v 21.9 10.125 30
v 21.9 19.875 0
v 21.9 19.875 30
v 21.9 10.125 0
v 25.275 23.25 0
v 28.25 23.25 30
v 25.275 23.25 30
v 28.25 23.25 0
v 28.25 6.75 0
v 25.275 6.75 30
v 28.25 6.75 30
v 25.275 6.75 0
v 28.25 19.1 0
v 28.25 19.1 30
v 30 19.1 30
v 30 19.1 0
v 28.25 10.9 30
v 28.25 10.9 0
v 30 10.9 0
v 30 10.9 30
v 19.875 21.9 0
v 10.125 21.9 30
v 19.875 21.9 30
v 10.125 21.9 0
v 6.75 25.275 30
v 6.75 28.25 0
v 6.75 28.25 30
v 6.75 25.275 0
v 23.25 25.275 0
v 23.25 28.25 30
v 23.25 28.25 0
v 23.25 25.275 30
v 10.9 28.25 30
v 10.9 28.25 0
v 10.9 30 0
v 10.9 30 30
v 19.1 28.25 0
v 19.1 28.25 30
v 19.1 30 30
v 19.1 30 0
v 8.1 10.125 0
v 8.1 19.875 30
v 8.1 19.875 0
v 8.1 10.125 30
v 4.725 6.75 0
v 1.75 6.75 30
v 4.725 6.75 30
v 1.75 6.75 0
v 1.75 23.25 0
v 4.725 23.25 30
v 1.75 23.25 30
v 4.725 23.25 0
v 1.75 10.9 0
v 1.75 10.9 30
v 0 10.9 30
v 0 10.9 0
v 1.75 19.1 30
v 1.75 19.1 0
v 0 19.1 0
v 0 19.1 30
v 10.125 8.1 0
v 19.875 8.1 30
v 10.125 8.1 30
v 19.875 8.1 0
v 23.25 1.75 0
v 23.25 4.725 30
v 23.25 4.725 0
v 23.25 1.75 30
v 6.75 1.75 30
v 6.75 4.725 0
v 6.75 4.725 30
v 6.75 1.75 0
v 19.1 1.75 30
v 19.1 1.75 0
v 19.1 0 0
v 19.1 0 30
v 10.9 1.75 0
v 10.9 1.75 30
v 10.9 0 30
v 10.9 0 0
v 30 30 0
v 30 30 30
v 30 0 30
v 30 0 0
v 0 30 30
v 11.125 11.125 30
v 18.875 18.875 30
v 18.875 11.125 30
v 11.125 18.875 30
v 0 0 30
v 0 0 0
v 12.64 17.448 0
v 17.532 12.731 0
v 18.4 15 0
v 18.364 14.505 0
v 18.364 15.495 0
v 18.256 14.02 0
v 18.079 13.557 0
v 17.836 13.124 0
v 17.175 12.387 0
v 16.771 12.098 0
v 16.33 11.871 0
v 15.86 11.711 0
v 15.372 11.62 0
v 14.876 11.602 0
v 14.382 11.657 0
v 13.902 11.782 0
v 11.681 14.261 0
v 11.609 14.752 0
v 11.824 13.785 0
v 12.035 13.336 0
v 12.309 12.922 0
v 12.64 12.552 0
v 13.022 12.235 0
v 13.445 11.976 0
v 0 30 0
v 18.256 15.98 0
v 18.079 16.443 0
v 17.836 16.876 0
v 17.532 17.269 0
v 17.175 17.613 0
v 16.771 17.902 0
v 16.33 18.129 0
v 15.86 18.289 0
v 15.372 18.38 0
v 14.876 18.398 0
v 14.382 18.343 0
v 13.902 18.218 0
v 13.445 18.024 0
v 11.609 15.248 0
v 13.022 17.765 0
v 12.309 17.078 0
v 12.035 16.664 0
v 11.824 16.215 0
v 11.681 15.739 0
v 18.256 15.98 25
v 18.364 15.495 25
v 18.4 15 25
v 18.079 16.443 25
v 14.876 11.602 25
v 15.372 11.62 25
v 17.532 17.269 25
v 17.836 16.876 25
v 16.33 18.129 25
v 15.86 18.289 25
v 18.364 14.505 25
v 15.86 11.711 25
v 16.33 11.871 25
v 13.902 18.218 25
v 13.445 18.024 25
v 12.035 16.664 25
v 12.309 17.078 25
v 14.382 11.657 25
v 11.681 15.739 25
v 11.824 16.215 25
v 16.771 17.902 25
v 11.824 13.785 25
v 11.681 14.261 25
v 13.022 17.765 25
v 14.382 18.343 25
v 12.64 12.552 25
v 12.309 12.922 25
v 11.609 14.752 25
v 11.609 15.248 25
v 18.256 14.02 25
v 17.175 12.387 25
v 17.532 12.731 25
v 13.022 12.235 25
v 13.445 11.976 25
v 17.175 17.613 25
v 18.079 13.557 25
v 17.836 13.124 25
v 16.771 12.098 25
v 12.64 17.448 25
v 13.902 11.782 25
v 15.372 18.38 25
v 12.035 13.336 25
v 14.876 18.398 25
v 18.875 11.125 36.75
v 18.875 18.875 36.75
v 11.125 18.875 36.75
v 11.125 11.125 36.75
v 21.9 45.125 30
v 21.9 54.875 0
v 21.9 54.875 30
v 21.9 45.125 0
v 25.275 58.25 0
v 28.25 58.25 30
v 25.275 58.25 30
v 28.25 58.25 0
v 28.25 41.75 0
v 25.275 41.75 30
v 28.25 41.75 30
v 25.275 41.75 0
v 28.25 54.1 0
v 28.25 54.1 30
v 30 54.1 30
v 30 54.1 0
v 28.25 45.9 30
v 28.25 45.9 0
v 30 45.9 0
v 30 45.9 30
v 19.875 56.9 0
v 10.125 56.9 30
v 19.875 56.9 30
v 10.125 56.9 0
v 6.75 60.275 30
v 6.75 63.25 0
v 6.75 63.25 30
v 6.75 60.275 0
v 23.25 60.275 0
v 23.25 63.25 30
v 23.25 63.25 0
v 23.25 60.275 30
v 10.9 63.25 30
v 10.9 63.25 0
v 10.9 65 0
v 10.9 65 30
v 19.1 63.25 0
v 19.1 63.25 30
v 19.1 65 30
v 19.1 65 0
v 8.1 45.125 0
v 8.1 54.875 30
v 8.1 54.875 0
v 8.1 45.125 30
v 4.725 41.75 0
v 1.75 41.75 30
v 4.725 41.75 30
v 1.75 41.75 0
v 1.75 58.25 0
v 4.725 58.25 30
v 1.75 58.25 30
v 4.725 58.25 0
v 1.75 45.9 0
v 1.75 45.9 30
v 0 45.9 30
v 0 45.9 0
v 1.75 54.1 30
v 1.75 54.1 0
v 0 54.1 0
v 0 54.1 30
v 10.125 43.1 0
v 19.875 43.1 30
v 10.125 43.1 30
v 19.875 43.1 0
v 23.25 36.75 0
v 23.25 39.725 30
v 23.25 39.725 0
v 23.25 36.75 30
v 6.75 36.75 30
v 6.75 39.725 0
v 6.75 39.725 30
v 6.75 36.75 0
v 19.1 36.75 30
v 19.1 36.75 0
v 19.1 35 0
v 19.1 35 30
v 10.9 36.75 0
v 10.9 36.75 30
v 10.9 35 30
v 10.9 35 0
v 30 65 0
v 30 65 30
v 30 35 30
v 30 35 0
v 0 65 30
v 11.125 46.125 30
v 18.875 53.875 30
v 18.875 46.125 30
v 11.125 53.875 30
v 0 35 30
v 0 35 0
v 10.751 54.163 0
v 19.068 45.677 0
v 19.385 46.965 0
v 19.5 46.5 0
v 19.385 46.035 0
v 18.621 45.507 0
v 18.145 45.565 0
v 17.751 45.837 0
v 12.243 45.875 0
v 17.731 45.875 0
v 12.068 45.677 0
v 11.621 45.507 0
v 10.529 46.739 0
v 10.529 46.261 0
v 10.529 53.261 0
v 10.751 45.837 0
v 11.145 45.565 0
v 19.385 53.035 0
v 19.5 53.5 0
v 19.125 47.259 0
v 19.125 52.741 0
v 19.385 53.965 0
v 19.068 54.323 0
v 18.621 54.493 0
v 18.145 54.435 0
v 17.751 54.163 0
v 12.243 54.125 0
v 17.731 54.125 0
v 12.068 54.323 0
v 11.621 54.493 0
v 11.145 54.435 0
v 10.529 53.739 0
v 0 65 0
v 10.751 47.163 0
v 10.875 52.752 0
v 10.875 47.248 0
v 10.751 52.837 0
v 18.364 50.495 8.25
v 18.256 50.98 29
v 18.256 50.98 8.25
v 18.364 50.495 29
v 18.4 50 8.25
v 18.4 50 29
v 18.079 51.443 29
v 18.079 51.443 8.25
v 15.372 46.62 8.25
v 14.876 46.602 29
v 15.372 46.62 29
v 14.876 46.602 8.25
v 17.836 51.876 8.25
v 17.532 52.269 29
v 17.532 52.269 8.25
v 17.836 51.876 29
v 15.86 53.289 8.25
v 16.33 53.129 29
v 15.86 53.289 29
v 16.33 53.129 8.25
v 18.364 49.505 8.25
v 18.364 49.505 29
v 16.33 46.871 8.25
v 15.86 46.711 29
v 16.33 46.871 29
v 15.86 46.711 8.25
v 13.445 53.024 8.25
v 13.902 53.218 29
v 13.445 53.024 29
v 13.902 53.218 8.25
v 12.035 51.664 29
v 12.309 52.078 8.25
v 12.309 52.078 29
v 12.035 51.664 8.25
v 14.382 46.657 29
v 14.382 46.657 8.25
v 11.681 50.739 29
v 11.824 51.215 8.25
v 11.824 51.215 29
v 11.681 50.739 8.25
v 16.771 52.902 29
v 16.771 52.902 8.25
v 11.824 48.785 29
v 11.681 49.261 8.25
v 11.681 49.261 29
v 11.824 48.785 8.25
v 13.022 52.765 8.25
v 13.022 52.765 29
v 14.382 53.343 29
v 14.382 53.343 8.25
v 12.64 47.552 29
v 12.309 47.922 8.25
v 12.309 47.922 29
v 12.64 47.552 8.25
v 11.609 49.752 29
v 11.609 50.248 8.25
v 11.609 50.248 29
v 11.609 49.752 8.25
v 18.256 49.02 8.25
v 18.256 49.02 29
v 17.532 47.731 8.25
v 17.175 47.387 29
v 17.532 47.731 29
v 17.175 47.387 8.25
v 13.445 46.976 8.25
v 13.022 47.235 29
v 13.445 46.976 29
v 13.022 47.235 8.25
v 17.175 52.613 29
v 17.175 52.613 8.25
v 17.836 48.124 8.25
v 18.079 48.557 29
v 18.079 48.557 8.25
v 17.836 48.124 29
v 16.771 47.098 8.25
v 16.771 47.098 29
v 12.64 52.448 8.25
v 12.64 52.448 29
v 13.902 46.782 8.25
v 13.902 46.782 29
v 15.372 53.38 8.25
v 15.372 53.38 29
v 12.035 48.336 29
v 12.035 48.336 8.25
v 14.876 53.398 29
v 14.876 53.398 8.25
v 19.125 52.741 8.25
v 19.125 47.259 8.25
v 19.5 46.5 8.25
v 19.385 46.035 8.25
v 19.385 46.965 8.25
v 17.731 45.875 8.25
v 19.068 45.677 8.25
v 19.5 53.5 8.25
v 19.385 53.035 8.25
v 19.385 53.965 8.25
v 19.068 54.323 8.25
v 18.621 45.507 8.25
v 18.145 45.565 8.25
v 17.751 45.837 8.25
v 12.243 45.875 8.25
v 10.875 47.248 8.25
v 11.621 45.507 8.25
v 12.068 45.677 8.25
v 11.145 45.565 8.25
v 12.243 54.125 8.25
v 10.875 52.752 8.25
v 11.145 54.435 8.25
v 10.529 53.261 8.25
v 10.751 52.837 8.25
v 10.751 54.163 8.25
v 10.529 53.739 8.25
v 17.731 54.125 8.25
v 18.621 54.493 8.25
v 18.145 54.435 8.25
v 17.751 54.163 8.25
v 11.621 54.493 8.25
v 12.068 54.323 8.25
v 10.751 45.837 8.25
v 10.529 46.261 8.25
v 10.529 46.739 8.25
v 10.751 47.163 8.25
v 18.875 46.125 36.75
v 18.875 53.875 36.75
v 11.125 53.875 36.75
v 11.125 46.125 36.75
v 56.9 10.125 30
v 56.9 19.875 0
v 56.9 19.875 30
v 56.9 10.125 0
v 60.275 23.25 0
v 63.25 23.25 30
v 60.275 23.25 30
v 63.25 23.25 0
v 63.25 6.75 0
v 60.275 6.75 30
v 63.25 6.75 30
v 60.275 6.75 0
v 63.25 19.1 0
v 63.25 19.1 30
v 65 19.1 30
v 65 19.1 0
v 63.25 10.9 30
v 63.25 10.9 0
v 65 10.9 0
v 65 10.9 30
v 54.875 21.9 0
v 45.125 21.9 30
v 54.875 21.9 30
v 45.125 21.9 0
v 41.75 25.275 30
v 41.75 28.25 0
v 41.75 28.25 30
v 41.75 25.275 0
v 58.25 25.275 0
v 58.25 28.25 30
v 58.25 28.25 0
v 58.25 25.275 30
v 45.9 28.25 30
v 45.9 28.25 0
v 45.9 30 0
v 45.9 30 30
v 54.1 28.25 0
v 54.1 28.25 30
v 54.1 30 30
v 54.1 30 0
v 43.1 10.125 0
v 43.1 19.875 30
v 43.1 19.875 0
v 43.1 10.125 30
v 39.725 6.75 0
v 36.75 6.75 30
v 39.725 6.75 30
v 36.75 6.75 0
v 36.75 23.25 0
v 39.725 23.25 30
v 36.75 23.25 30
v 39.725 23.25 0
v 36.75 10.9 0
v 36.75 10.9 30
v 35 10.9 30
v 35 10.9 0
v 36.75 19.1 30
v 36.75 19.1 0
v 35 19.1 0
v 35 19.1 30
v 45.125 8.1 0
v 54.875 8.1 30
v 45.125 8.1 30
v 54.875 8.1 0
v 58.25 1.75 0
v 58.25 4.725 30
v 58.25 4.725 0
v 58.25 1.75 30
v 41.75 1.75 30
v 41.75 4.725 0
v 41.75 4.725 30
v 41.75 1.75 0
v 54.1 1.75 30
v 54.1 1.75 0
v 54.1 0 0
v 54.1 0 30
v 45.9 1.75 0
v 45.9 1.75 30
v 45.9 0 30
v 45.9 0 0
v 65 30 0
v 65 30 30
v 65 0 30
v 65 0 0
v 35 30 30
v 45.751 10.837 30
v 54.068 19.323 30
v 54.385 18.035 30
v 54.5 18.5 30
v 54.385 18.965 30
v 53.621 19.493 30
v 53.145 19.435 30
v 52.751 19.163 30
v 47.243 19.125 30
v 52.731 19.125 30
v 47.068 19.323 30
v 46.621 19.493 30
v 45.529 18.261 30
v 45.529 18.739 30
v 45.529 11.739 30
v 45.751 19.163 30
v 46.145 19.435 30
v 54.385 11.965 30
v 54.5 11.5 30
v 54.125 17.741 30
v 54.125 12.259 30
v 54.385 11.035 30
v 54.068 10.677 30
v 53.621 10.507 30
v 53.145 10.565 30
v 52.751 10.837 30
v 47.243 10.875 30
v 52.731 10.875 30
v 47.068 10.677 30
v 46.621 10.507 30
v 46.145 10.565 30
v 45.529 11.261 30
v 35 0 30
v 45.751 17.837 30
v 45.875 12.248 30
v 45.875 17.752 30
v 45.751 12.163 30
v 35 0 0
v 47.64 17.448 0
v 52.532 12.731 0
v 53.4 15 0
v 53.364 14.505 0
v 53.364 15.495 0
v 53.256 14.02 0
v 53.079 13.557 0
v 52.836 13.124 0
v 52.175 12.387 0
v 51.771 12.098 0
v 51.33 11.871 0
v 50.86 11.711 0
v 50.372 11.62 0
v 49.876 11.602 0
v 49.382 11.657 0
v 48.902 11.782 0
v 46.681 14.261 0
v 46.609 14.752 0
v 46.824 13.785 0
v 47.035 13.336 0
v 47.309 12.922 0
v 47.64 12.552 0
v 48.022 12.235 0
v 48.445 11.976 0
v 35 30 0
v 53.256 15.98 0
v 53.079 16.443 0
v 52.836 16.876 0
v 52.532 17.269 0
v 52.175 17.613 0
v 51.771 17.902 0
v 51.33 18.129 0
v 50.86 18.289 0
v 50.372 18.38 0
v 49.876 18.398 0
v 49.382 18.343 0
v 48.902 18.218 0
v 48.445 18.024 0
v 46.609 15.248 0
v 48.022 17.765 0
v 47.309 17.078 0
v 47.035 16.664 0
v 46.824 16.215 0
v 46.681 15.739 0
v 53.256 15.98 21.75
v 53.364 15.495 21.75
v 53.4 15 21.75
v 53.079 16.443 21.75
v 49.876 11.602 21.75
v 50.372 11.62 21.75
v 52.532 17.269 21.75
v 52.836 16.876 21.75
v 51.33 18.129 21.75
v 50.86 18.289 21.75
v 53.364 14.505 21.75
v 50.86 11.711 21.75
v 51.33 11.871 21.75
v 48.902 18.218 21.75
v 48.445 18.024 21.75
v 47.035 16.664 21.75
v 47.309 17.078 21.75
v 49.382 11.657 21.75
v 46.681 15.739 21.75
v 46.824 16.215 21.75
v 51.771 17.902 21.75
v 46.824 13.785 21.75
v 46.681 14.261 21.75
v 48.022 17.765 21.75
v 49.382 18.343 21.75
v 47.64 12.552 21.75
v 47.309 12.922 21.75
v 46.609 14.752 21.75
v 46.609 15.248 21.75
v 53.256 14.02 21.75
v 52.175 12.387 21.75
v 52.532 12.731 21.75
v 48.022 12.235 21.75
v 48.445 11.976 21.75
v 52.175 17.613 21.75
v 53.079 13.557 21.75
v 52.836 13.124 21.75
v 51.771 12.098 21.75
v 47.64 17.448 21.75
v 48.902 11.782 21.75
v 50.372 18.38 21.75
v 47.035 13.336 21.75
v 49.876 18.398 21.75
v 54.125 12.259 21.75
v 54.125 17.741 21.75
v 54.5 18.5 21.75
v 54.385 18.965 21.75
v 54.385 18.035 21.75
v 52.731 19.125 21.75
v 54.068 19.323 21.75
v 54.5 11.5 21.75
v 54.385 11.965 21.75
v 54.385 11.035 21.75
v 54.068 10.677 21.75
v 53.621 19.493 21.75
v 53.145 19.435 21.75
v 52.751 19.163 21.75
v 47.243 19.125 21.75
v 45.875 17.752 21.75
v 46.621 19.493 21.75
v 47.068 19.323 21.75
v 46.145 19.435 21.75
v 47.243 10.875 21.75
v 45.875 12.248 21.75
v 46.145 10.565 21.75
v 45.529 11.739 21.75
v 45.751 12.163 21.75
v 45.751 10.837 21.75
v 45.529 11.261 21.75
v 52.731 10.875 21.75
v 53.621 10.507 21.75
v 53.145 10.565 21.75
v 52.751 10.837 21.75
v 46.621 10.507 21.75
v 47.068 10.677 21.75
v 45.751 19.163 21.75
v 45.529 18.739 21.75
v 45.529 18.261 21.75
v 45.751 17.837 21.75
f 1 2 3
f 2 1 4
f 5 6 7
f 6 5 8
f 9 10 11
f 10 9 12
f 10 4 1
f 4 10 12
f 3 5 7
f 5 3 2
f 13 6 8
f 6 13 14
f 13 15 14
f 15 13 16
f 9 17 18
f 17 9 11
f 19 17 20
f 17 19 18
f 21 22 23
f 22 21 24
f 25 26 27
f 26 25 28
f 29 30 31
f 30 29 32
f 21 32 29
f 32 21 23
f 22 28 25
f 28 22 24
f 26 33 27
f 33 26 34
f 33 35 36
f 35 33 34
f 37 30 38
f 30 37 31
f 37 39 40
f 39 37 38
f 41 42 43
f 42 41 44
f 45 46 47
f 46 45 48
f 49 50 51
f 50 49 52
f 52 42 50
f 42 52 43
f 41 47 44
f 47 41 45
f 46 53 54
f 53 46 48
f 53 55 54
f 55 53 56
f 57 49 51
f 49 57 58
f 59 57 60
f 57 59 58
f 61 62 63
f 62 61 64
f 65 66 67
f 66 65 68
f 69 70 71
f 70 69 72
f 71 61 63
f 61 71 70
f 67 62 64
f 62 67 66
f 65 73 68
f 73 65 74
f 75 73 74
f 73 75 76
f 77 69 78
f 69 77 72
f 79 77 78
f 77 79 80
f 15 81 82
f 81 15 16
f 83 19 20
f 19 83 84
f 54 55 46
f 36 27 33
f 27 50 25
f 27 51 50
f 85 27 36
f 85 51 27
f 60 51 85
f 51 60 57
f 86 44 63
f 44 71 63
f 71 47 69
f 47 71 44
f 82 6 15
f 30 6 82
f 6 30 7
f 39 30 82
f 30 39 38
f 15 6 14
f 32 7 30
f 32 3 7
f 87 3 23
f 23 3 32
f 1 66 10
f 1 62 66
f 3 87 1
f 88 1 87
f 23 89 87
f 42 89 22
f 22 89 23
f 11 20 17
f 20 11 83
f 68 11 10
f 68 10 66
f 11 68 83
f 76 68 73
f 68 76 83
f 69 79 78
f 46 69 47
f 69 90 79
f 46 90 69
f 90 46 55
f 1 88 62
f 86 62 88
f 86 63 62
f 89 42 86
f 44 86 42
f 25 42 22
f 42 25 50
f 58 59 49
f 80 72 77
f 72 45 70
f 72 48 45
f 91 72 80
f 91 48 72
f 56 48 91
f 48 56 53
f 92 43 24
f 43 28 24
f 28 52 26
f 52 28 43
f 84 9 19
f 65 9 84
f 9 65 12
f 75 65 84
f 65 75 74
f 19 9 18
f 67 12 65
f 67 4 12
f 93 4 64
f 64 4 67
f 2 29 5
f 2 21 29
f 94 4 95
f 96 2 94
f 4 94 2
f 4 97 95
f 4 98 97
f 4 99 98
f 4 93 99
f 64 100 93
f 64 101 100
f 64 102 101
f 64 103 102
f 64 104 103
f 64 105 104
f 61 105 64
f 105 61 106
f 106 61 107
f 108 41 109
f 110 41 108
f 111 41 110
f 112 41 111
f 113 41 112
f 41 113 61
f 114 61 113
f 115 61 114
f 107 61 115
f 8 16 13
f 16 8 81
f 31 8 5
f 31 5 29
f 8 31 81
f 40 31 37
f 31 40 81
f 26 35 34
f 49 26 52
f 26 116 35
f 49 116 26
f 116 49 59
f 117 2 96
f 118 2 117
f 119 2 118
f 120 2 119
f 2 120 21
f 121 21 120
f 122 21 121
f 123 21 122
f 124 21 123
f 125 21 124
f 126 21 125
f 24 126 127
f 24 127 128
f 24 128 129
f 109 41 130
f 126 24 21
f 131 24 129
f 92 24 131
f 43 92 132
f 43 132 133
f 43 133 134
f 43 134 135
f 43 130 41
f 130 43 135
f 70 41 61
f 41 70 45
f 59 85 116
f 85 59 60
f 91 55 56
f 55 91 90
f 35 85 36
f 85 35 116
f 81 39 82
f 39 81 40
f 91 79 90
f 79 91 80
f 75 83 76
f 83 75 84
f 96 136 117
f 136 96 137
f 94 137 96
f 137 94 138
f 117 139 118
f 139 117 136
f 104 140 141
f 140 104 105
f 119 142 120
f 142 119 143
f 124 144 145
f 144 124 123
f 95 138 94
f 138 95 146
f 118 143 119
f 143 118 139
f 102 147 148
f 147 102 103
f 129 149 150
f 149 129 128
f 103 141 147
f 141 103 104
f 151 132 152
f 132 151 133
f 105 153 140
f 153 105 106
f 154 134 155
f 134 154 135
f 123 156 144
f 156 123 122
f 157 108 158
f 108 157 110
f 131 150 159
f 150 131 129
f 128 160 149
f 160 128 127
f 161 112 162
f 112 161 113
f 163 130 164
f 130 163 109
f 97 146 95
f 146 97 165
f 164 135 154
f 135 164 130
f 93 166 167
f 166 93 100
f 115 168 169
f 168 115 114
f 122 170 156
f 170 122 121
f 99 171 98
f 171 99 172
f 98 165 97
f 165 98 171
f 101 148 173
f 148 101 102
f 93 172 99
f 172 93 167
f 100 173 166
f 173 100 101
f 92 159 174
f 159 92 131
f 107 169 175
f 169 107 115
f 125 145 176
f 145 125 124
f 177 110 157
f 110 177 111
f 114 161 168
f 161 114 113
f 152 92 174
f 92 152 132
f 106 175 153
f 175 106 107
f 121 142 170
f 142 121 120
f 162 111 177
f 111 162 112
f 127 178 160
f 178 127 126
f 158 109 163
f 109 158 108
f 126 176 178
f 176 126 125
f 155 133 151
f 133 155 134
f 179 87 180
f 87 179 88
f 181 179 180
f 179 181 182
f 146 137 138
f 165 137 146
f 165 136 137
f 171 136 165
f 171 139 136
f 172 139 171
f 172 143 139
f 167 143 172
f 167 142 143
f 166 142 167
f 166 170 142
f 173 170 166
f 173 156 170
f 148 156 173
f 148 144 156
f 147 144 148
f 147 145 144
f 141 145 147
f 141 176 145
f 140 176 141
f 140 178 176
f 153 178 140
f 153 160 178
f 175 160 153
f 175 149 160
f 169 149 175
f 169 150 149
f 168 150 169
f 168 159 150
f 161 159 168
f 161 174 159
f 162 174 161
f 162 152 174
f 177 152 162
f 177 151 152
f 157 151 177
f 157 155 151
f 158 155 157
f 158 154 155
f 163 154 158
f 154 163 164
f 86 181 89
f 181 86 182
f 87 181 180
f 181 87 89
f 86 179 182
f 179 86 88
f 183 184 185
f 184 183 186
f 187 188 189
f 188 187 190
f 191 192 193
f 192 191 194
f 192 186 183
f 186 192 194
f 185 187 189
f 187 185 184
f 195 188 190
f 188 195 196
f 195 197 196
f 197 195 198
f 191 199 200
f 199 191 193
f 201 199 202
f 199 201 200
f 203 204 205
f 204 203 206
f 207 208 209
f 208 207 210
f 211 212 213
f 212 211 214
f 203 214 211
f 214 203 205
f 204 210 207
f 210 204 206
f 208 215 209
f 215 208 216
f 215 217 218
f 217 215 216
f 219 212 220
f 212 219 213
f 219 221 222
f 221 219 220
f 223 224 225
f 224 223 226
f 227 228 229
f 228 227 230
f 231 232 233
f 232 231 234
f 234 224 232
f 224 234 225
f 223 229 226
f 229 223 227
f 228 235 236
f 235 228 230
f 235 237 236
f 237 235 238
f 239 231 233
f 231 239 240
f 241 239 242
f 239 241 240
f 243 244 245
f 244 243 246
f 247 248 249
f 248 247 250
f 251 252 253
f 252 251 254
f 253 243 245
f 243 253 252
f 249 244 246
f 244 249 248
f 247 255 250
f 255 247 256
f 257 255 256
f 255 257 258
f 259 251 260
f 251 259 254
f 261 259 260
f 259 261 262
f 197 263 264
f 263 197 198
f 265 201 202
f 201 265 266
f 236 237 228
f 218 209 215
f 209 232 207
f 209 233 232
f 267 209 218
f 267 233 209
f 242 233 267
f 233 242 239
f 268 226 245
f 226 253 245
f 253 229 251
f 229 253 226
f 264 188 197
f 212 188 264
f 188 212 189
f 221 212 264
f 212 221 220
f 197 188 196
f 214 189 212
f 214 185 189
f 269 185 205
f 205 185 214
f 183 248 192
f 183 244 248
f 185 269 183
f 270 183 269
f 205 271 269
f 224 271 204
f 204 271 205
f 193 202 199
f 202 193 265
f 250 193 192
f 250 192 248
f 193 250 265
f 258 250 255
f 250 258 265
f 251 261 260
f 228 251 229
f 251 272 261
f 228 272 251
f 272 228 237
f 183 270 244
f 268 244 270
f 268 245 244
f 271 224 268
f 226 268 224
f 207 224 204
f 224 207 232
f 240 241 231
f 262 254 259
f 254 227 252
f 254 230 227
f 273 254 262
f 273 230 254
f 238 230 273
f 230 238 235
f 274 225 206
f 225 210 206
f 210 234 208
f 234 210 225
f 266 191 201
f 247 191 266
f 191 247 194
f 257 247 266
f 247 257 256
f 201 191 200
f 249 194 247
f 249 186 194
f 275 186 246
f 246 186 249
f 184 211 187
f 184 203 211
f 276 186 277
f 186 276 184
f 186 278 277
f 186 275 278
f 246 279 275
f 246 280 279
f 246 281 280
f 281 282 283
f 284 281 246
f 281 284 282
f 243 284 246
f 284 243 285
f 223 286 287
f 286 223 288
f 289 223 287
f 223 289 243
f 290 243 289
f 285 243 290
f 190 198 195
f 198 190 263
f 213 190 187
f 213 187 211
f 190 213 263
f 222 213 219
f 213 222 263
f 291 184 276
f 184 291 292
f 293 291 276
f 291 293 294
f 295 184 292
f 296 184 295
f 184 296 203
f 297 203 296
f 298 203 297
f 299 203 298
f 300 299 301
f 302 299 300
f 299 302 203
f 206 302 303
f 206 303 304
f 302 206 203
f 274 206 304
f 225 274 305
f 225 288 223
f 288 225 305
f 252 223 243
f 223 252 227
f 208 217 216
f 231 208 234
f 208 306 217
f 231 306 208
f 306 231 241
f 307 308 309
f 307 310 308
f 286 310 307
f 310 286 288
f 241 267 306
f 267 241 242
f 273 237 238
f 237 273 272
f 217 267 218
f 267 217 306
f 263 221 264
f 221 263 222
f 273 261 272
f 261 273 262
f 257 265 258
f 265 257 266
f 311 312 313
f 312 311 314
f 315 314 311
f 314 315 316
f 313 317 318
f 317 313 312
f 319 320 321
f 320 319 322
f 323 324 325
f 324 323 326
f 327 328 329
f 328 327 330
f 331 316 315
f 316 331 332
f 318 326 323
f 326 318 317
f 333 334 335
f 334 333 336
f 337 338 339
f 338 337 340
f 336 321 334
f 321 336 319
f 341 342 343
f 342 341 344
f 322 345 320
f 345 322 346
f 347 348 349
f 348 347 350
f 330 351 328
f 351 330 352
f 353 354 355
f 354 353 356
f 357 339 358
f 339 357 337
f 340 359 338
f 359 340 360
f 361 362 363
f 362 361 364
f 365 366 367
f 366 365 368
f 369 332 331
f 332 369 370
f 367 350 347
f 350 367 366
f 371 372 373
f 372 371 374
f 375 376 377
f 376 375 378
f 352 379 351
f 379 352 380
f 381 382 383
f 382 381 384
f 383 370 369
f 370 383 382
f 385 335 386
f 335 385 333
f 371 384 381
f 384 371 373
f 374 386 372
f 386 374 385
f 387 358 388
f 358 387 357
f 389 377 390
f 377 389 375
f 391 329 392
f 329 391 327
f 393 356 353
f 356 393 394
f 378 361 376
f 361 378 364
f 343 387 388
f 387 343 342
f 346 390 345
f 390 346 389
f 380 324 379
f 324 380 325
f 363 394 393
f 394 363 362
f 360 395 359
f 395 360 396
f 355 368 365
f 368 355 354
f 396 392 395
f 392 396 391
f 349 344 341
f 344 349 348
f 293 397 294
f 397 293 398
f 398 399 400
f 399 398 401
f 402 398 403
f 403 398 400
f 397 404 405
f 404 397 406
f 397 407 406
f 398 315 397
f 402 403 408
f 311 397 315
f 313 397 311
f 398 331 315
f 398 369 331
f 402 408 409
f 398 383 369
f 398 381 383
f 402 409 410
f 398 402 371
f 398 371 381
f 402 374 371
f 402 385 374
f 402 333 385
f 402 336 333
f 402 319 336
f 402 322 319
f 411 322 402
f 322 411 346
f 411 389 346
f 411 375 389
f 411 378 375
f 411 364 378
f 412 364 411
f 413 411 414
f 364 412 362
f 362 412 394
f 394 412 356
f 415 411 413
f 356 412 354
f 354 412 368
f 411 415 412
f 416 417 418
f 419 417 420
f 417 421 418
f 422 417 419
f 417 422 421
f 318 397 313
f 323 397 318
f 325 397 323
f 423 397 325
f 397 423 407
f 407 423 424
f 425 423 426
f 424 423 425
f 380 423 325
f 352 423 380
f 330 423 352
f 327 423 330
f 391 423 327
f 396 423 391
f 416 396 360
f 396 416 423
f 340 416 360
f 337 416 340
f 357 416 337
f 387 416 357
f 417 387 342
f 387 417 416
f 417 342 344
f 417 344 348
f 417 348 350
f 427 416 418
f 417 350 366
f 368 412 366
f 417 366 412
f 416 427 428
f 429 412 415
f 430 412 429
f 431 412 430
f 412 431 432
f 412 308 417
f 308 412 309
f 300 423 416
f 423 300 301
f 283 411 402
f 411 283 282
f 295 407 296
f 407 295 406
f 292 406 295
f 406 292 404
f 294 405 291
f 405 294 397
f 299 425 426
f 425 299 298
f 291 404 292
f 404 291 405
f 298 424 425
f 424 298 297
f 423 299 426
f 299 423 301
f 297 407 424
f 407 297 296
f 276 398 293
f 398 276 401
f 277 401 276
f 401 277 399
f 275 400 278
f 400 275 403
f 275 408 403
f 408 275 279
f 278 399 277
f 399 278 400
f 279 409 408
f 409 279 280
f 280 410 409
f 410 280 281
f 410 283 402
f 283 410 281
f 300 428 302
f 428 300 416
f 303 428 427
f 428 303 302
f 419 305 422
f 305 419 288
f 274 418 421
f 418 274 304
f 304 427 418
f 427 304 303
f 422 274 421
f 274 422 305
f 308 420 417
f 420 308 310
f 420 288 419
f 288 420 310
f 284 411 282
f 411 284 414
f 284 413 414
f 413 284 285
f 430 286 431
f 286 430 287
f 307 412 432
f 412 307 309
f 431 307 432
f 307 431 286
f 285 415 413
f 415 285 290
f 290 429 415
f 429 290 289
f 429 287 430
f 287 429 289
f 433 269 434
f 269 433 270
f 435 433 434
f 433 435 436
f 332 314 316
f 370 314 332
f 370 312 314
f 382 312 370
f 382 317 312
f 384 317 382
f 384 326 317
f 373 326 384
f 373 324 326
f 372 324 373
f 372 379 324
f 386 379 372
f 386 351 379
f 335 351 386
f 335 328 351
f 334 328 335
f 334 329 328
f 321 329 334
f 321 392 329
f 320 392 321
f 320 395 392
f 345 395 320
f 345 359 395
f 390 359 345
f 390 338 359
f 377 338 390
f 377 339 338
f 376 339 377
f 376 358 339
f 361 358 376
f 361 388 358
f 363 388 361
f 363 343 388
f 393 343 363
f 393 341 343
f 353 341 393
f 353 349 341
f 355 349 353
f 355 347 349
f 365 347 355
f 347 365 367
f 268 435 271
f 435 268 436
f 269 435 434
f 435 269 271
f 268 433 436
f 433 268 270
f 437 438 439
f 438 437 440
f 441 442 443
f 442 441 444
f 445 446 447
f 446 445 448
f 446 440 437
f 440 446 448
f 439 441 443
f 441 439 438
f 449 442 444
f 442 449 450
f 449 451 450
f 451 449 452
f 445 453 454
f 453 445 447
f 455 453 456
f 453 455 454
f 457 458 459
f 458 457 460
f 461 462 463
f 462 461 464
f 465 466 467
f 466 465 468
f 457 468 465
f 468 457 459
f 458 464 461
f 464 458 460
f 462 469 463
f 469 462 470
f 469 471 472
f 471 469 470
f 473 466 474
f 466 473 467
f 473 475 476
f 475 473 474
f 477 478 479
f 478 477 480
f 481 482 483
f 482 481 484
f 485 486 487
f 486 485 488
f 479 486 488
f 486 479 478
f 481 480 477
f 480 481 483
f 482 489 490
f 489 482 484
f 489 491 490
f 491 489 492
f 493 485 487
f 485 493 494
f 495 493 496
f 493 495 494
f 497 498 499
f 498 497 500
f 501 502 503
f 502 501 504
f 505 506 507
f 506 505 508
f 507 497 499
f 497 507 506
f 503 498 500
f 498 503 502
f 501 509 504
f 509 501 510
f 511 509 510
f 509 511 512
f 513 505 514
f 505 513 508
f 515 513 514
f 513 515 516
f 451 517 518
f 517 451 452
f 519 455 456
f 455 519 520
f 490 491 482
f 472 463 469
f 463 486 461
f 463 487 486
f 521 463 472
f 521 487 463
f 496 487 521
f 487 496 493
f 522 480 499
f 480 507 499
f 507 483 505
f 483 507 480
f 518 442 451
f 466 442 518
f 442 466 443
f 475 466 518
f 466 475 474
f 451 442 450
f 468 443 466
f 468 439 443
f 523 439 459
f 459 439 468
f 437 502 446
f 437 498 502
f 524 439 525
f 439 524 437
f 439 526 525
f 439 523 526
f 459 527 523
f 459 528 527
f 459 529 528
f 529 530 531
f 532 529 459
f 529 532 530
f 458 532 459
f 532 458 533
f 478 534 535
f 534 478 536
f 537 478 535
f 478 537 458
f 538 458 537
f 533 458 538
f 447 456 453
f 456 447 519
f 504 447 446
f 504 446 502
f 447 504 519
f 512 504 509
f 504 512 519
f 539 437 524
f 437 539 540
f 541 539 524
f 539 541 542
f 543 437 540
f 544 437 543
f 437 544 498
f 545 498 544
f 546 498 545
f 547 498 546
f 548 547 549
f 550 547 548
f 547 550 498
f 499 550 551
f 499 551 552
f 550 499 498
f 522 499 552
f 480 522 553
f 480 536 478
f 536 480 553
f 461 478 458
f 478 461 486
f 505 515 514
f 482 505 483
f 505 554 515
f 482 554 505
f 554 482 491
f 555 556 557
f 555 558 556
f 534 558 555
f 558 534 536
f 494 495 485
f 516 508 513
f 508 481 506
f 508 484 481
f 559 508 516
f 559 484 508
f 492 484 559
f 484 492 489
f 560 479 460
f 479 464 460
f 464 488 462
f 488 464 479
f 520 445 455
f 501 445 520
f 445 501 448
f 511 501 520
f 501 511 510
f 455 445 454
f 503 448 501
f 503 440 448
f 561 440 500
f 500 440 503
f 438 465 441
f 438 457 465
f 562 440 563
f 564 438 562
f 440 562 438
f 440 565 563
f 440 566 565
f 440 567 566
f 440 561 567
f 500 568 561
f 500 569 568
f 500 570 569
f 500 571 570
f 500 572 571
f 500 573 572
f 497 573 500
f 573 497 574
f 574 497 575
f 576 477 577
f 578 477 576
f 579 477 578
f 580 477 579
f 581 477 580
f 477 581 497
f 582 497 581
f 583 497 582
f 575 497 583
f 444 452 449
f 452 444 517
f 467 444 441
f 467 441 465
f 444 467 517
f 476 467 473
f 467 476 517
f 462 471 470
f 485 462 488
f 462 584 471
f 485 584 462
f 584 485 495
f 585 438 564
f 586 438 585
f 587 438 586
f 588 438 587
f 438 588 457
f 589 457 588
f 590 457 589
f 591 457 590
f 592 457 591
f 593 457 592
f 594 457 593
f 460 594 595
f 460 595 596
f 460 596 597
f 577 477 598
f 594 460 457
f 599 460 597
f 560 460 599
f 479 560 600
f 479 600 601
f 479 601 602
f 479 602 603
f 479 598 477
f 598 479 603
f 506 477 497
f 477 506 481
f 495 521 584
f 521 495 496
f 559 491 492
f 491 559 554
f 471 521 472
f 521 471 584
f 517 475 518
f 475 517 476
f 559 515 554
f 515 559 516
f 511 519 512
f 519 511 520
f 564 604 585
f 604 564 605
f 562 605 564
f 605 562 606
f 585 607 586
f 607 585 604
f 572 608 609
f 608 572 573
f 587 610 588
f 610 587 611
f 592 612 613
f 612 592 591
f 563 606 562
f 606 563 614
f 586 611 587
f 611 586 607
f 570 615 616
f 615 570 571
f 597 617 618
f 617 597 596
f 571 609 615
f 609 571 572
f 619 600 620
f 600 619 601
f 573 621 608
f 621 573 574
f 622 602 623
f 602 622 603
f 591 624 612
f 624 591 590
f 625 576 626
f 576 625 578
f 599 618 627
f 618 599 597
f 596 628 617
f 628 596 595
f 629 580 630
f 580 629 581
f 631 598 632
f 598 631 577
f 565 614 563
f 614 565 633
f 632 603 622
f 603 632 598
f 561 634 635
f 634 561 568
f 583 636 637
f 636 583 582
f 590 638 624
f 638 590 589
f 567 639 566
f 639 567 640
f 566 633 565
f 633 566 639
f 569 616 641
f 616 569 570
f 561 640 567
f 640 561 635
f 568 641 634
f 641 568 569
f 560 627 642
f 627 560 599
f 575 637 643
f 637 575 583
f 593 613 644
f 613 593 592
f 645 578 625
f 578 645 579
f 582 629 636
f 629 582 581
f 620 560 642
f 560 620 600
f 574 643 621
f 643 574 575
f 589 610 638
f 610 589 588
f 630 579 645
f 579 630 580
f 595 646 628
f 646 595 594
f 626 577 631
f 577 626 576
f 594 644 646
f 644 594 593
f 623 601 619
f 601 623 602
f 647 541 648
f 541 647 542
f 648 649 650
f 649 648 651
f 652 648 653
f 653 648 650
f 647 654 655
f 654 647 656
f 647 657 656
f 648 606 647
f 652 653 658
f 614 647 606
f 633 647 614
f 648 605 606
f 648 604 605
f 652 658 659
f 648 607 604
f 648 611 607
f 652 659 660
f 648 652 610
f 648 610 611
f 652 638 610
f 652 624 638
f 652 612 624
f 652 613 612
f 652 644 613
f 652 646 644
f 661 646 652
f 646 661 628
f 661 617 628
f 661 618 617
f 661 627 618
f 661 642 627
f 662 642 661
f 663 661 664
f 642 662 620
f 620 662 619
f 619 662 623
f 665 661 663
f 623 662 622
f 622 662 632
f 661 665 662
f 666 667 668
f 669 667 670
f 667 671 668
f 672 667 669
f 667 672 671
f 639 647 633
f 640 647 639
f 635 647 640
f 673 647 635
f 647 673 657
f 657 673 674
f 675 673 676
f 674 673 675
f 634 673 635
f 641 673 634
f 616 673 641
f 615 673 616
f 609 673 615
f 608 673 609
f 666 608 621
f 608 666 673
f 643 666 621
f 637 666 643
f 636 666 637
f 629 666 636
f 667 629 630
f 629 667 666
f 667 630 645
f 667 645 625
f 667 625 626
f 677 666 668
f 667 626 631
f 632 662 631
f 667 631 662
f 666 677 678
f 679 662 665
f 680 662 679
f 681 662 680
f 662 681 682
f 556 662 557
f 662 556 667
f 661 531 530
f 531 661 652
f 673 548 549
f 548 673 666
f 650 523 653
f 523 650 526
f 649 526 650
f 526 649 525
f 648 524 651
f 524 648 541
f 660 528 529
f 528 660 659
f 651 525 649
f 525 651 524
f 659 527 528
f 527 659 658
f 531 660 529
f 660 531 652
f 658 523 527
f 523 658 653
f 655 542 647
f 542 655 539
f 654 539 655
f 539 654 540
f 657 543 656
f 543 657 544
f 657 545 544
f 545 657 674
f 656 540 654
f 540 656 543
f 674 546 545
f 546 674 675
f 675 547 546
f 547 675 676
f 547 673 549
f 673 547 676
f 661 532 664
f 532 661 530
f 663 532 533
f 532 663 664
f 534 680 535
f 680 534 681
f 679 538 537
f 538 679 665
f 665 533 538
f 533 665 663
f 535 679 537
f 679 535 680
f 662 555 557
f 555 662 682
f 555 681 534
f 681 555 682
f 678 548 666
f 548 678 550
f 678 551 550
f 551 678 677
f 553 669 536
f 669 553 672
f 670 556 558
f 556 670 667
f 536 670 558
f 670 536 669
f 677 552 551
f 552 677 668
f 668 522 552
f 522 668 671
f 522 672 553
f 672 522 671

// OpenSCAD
profileLength = 90;
//printX = 150; Not implemented
//printY = 150; Not implemented
printZHeight = 50;
printTolerance = 0.25; //Change dimensions of pin and hole 0.25mm equals gab of 0.5 mm
spaceBetweenProfiles = 5;
$fa=0.5; // default minimum facet angle is now 0.5
$fs=0.5; // default minimum facet size is now 0.5 mm

if(profileLength <= printZHeight) {
	translate([15,15,profileLength/2]) profile(profileLength);
} else {
	numOfProfiles = ceil(profileLength/(printZHeight-8));
	numOfRow = ceil(sqrt(numOfProfiles));
	currentProfile = 2;
	start = 0;
	translate([start,start,0]) profileWithPin(profileLength/numOfProfiles, printTolerance);
	for(row=[0:numOfRow-1]) {
		for(col=[0:numOfRow-1]) {
			if(row*numOfRow+col < numOfProfiles-1 && row*numOfRow+col > 0) {
				translate([start+row*(30+spaceBetweenProfiles),start+col*(30+spaceBetweenProfiles),0]) profileWithHoleAndPin(profileLength/numOfProfiles, printTolerance);
			} else {
				if(row*numOfRow+col < numOfProfiles) {
					translate([start+row*(30+spaceBetweenProfiles),start+col*(30+spaceBetweenProfiles),0]) profileWithHole(profileLength/numOfProfiles, printTolerance);
					lastProfileDone = 1;
				}
			}
		}
	}
}

module hole(height, size) {
	radius = 1;
	divider = 1.6;
	union() {
		cube([size,size,height], center = true);
		translate([size/2-radius/divider,size/2-radius/divider,0]) cylinder(h=height, r=radius, center = true);
		translate([size/2-radius/divider,-size/2+radius/divider,0]) cylinder(h=height, r=radius, center = true);
		translate([-size/2+radius/divider,size/2-radius/divider,0]) cylinder(h=height, r=radius, center = true);
		translate([-size/2+radius/divider,-size/2+radius/divider,0]) cylinder(h=height, r=radius, center = true);
	}
}

module profileWithPin(length, tolerance) {
	height = 8 - tolerance - 1;
	size = 8 - tolerance;
	plunge = 5;
	translate([15,15,length/2]) union() {
		profile(length);
		translate([0,0,length/2+(height+plunge)/2-plunge]) cube([size,size,height+plunge], center = true);
	}
}

module profileWithHole(length, tolerance) {
	height = 8 + tolerance;
	size = 8 + tolerance;
	plunge = 1;
	translate([15,15,length/2]) difference() {
		profile(length);
		translate([0,0,length/2-(height+plunge)/2+plunge]) hole(height+plunge, size);
	}
}

module profileWithHoleAndPin(length, tolerance) {
	heightHole = 8 + tolerance;
	heightPin = 7 - tolerance;
	size = 8;
	plunge = 1;
	translate([15,15,length/2]) union() {
		difference() {
			profile(length);
			translate([0,0,-length/2+(heightHole+plunge)/2-plunge]) hole(heightHole+plunge, size+tolerance);
		}
		translate([0,0,length/2+(heightPin+plunge)/2-plunge]) cube([size-tolerance,size-tolerance,heightPin+plunge], center = true);
	}
}

module profile(length) { // generate a profile based on length
	difference() {
		// Create main body
		cube([30,30,length], center = true);
		
		// Create hole in middle
		cylinder(r=6.8/2, h=length+2, center = true);

		// Create groove
		grooveLength = length + 2;
		lengthOfCenterSide = 9.75;
		gabWidth = 8.2;
		gabDepth = 8.1;
		sizeOfCube = 16.5;
		gabFrontWallWidth = 1.75;
		sizeOfCornerCube = sqrt(pow(sizeOfCube/2, 2)*2);
		for(i = [0:90:270]) {
			rotate([0,0,i]) translate([sizeOfCube/2-gabDepth+30/2,0,0]) difference() {
				cube([sizeOfCube,sizeOfCube,grooveLength], center = true);
				translate([-sizeOfCube/2,-sizeOfCube/2-lengthOfCenterSide/2,0]) rotate([0,0,45]) cube([sizeOfCornerCube,sizeOfCornerCube,grooveLength+2], center = true);
				translate([-sizeOfCube/2,sizeOfCube/2+lengthOfCenterSide/2,0]) rotate([0,0,45]) cube([sizeOfCornerCube,sizeOfCornerCube,grooveLength+2], center = true);
				translate([gabDepth-gabFrontWallWidth,sizeOfCube/2+gabWidth/2,0]) cube([sizeOfCube,sizeOfCube,grooveLength+2], center = true);
				translate([gabDepth-gabFrontWallWidth,-sizeOfCube/2-gabWidth/2,0]) cube([sizeOfCube,sizeOfCube,grooveLength+2], center = true);
			}
		}
	}
}
//cube([30,30,length]);
